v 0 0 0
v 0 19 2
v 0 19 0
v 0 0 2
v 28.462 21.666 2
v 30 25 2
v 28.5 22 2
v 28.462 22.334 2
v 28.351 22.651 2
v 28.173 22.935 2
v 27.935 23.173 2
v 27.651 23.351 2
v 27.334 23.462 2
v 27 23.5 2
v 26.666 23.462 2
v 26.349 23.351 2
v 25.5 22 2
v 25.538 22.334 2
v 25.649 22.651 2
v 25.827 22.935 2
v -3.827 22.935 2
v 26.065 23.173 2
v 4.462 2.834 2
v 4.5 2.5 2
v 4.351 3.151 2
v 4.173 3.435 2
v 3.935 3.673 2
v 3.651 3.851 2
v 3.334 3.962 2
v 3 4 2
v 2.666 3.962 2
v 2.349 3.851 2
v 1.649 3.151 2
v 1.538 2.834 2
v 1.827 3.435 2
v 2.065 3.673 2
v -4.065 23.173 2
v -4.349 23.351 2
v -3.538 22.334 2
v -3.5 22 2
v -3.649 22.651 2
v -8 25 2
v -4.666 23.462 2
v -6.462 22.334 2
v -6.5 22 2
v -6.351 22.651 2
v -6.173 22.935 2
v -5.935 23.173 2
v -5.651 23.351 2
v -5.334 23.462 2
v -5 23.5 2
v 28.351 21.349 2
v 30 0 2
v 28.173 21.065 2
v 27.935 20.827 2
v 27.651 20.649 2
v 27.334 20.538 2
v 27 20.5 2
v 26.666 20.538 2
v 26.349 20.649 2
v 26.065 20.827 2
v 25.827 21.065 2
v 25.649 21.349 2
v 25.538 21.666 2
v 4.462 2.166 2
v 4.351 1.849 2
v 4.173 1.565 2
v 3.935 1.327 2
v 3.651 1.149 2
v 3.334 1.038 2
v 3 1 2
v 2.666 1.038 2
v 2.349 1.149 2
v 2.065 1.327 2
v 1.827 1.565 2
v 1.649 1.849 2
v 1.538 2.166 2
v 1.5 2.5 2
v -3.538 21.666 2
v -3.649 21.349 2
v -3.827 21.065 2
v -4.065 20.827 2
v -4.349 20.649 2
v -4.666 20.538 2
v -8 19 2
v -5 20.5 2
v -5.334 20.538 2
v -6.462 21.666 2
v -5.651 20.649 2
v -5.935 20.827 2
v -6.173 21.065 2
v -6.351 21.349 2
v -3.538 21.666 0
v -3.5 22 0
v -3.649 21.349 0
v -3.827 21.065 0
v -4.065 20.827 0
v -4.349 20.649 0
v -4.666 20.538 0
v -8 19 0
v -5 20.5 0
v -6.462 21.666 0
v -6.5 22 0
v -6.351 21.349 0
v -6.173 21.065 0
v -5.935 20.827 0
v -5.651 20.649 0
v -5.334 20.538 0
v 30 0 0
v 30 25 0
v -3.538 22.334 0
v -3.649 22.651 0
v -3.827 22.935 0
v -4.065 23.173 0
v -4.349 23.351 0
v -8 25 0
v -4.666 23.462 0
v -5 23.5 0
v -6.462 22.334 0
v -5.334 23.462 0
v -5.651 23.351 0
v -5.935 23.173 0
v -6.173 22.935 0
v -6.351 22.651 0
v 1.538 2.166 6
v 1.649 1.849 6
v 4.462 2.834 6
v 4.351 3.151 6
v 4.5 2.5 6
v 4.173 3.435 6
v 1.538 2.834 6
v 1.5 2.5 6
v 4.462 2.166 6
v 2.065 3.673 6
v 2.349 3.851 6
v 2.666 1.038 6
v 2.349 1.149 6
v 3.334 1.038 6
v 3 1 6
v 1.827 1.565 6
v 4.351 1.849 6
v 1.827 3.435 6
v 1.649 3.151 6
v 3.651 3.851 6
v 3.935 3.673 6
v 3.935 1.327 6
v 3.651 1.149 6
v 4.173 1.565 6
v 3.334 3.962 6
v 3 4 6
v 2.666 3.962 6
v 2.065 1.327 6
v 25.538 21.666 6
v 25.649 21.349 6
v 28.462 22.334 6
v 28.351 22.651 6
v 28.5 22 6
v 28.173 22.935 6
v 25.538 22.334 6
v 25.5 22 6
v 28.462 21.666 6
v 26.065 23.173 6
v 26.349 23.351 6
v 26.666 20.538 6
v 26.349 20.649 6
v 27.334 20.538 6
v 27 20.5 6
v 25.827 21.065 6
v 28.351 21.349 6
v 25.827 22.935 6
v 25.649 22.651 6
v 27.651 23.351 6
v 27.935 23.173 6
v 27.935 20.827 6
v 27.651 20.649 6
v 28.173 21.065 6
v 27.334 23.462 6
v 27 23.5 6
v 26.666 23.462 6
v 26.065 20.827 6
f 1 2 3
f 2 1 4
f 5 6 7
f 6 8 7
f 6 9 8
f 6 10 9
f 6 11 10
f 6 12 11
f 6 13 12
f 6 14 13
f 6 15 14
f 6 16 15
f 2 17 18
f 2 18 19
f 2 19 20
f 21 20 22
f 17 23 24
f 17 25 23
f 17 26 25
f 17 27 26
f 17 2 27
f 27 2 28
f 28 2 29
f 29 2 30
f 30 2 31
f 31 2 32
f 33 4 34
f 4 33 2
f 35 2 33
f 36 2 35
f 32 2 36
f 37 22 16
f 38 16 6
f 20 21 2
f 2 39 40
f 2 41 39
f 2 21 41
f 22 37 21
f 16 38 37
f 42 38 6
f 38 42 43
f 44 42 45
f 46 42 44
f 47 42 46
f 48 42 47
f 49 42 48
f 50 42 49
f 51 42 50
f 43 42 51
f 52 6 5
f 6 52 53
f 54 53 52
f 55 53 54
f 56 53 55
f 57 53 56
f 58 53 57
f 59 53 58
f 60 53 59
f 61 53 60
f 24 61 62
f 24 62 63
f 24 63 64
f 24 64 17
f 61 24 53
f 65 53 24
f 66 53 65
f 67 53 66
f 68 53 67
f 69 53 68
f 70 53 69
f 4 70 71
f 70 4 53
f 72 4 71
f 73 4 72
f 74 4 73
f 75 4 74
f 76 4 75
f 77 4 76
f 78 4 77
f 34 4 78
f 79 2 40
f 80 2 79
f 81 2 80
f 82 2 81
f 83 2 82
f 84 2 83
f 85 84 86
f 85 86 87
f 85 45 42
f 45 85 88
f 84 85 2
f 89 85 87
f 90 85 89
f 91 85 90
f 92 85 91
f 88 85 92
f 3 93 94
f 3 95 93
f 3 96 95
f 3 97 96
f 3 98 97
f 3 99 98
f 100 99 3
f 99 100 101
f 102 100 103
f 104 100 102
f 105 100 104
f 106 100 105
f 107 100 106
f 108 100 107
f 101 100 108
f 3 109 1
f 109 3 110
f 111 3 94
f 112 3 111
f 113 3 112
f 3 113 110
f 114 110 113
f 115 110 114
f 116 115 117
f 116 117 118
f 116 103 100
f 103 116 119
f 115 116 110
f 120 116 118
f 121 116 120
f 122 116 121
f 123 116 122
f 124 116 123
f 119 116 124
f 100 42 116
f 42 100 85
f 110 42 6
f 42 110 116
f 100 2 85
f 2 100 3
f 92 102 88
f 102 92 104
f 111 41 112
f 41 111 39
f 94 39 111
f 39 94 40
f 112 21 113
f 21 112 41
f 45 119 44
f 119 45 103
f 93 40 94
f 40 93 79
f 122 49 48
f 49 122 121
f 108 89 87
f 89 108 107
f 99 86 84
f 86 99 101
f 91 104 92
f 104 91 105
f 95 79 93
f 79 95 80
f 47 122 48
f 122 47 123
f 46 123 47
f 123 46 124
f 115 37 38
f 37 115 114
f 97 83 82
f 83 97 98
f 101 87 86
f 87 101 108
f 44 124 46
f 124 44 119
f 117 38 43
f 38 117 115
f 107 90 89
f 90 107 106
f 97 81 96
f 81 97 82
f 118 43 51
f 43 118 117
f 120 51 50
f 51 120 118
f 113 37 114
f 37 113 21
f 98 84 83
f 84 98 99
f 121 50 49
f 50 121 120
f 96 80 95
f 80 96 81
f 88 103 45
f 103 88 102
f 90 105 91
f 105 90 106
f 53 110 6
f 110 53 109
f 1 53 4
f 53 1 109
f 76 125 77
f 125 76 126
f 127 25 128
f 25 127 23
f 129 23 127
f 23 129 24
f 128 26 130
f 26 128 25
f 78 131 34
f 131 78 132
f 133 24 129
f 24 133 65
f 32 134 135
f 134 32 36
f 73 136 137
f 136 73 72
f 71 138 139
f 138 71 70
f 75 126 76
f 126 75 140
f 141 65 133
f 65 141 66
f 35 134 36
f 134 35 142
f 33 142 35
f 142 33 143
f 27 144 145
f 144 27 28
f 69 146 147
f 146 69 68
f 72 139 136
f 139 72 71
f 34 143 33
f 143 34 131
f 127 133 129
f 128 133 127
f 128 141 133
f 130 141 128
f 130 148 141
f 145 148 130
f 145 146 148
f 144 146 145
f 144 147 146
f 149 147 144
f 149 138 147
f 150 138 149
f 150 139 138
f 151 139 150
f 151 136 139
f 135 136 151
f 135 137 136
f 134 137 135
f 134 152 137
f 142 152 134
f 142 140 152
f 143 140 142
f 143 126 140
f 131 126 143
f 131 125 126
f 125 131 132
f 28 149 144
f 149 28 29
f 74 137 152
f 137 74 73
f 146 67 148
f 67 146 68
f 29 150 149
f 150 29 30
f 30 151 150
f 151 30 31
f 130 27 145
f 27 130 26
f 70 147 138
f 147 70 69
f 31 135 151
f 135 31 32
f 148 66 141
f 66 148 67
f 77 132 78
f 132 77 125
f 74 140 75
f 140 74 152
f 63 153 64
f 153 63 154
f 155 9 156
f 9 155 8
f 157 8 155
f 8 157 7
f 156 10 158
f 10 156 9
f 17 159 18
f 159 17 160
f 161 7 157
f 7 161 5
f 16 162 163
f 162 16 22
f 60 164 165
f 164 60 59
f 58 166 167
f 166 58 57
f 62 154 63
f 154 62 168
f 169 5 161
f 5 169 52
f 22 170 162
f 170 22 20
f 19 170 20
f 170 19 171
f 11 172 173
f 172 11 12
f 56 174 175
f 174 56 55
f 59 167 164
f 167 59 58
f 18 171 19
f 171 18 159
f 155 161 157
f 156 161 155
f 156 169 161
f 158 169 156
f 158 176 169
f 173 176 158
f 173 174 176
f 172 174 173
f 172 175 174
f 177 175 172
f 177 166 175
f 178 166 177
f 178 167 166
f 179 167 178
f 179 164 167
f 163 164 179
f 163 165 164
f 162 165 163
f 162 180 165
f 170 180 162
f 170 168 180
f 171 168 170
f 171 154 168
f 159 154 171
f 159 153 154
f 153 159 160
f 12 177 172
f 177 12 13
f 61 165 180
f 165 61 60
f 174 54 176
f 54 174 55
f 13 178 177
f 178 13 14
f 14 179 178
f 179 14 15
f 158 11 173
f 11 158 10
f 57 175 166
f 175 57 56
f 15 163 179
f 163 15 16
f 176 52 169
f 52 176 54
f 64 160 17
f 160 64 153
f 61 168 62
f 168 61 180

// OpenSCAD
//number of fragments
$fn=28;

cube([30,25,2]);

translate([3,2.5,2]){
    cylinder(h=4,r=1.5);
}

translate([27,22,2]){
    cylinder(h=4,r=1.5);
}

translate([-8,19,0]){
    difference(){
        cube([8,6,2]);
        translate([3,3,-1]){
            cylinder(h=4,r=1.5);
        }
    }
}
